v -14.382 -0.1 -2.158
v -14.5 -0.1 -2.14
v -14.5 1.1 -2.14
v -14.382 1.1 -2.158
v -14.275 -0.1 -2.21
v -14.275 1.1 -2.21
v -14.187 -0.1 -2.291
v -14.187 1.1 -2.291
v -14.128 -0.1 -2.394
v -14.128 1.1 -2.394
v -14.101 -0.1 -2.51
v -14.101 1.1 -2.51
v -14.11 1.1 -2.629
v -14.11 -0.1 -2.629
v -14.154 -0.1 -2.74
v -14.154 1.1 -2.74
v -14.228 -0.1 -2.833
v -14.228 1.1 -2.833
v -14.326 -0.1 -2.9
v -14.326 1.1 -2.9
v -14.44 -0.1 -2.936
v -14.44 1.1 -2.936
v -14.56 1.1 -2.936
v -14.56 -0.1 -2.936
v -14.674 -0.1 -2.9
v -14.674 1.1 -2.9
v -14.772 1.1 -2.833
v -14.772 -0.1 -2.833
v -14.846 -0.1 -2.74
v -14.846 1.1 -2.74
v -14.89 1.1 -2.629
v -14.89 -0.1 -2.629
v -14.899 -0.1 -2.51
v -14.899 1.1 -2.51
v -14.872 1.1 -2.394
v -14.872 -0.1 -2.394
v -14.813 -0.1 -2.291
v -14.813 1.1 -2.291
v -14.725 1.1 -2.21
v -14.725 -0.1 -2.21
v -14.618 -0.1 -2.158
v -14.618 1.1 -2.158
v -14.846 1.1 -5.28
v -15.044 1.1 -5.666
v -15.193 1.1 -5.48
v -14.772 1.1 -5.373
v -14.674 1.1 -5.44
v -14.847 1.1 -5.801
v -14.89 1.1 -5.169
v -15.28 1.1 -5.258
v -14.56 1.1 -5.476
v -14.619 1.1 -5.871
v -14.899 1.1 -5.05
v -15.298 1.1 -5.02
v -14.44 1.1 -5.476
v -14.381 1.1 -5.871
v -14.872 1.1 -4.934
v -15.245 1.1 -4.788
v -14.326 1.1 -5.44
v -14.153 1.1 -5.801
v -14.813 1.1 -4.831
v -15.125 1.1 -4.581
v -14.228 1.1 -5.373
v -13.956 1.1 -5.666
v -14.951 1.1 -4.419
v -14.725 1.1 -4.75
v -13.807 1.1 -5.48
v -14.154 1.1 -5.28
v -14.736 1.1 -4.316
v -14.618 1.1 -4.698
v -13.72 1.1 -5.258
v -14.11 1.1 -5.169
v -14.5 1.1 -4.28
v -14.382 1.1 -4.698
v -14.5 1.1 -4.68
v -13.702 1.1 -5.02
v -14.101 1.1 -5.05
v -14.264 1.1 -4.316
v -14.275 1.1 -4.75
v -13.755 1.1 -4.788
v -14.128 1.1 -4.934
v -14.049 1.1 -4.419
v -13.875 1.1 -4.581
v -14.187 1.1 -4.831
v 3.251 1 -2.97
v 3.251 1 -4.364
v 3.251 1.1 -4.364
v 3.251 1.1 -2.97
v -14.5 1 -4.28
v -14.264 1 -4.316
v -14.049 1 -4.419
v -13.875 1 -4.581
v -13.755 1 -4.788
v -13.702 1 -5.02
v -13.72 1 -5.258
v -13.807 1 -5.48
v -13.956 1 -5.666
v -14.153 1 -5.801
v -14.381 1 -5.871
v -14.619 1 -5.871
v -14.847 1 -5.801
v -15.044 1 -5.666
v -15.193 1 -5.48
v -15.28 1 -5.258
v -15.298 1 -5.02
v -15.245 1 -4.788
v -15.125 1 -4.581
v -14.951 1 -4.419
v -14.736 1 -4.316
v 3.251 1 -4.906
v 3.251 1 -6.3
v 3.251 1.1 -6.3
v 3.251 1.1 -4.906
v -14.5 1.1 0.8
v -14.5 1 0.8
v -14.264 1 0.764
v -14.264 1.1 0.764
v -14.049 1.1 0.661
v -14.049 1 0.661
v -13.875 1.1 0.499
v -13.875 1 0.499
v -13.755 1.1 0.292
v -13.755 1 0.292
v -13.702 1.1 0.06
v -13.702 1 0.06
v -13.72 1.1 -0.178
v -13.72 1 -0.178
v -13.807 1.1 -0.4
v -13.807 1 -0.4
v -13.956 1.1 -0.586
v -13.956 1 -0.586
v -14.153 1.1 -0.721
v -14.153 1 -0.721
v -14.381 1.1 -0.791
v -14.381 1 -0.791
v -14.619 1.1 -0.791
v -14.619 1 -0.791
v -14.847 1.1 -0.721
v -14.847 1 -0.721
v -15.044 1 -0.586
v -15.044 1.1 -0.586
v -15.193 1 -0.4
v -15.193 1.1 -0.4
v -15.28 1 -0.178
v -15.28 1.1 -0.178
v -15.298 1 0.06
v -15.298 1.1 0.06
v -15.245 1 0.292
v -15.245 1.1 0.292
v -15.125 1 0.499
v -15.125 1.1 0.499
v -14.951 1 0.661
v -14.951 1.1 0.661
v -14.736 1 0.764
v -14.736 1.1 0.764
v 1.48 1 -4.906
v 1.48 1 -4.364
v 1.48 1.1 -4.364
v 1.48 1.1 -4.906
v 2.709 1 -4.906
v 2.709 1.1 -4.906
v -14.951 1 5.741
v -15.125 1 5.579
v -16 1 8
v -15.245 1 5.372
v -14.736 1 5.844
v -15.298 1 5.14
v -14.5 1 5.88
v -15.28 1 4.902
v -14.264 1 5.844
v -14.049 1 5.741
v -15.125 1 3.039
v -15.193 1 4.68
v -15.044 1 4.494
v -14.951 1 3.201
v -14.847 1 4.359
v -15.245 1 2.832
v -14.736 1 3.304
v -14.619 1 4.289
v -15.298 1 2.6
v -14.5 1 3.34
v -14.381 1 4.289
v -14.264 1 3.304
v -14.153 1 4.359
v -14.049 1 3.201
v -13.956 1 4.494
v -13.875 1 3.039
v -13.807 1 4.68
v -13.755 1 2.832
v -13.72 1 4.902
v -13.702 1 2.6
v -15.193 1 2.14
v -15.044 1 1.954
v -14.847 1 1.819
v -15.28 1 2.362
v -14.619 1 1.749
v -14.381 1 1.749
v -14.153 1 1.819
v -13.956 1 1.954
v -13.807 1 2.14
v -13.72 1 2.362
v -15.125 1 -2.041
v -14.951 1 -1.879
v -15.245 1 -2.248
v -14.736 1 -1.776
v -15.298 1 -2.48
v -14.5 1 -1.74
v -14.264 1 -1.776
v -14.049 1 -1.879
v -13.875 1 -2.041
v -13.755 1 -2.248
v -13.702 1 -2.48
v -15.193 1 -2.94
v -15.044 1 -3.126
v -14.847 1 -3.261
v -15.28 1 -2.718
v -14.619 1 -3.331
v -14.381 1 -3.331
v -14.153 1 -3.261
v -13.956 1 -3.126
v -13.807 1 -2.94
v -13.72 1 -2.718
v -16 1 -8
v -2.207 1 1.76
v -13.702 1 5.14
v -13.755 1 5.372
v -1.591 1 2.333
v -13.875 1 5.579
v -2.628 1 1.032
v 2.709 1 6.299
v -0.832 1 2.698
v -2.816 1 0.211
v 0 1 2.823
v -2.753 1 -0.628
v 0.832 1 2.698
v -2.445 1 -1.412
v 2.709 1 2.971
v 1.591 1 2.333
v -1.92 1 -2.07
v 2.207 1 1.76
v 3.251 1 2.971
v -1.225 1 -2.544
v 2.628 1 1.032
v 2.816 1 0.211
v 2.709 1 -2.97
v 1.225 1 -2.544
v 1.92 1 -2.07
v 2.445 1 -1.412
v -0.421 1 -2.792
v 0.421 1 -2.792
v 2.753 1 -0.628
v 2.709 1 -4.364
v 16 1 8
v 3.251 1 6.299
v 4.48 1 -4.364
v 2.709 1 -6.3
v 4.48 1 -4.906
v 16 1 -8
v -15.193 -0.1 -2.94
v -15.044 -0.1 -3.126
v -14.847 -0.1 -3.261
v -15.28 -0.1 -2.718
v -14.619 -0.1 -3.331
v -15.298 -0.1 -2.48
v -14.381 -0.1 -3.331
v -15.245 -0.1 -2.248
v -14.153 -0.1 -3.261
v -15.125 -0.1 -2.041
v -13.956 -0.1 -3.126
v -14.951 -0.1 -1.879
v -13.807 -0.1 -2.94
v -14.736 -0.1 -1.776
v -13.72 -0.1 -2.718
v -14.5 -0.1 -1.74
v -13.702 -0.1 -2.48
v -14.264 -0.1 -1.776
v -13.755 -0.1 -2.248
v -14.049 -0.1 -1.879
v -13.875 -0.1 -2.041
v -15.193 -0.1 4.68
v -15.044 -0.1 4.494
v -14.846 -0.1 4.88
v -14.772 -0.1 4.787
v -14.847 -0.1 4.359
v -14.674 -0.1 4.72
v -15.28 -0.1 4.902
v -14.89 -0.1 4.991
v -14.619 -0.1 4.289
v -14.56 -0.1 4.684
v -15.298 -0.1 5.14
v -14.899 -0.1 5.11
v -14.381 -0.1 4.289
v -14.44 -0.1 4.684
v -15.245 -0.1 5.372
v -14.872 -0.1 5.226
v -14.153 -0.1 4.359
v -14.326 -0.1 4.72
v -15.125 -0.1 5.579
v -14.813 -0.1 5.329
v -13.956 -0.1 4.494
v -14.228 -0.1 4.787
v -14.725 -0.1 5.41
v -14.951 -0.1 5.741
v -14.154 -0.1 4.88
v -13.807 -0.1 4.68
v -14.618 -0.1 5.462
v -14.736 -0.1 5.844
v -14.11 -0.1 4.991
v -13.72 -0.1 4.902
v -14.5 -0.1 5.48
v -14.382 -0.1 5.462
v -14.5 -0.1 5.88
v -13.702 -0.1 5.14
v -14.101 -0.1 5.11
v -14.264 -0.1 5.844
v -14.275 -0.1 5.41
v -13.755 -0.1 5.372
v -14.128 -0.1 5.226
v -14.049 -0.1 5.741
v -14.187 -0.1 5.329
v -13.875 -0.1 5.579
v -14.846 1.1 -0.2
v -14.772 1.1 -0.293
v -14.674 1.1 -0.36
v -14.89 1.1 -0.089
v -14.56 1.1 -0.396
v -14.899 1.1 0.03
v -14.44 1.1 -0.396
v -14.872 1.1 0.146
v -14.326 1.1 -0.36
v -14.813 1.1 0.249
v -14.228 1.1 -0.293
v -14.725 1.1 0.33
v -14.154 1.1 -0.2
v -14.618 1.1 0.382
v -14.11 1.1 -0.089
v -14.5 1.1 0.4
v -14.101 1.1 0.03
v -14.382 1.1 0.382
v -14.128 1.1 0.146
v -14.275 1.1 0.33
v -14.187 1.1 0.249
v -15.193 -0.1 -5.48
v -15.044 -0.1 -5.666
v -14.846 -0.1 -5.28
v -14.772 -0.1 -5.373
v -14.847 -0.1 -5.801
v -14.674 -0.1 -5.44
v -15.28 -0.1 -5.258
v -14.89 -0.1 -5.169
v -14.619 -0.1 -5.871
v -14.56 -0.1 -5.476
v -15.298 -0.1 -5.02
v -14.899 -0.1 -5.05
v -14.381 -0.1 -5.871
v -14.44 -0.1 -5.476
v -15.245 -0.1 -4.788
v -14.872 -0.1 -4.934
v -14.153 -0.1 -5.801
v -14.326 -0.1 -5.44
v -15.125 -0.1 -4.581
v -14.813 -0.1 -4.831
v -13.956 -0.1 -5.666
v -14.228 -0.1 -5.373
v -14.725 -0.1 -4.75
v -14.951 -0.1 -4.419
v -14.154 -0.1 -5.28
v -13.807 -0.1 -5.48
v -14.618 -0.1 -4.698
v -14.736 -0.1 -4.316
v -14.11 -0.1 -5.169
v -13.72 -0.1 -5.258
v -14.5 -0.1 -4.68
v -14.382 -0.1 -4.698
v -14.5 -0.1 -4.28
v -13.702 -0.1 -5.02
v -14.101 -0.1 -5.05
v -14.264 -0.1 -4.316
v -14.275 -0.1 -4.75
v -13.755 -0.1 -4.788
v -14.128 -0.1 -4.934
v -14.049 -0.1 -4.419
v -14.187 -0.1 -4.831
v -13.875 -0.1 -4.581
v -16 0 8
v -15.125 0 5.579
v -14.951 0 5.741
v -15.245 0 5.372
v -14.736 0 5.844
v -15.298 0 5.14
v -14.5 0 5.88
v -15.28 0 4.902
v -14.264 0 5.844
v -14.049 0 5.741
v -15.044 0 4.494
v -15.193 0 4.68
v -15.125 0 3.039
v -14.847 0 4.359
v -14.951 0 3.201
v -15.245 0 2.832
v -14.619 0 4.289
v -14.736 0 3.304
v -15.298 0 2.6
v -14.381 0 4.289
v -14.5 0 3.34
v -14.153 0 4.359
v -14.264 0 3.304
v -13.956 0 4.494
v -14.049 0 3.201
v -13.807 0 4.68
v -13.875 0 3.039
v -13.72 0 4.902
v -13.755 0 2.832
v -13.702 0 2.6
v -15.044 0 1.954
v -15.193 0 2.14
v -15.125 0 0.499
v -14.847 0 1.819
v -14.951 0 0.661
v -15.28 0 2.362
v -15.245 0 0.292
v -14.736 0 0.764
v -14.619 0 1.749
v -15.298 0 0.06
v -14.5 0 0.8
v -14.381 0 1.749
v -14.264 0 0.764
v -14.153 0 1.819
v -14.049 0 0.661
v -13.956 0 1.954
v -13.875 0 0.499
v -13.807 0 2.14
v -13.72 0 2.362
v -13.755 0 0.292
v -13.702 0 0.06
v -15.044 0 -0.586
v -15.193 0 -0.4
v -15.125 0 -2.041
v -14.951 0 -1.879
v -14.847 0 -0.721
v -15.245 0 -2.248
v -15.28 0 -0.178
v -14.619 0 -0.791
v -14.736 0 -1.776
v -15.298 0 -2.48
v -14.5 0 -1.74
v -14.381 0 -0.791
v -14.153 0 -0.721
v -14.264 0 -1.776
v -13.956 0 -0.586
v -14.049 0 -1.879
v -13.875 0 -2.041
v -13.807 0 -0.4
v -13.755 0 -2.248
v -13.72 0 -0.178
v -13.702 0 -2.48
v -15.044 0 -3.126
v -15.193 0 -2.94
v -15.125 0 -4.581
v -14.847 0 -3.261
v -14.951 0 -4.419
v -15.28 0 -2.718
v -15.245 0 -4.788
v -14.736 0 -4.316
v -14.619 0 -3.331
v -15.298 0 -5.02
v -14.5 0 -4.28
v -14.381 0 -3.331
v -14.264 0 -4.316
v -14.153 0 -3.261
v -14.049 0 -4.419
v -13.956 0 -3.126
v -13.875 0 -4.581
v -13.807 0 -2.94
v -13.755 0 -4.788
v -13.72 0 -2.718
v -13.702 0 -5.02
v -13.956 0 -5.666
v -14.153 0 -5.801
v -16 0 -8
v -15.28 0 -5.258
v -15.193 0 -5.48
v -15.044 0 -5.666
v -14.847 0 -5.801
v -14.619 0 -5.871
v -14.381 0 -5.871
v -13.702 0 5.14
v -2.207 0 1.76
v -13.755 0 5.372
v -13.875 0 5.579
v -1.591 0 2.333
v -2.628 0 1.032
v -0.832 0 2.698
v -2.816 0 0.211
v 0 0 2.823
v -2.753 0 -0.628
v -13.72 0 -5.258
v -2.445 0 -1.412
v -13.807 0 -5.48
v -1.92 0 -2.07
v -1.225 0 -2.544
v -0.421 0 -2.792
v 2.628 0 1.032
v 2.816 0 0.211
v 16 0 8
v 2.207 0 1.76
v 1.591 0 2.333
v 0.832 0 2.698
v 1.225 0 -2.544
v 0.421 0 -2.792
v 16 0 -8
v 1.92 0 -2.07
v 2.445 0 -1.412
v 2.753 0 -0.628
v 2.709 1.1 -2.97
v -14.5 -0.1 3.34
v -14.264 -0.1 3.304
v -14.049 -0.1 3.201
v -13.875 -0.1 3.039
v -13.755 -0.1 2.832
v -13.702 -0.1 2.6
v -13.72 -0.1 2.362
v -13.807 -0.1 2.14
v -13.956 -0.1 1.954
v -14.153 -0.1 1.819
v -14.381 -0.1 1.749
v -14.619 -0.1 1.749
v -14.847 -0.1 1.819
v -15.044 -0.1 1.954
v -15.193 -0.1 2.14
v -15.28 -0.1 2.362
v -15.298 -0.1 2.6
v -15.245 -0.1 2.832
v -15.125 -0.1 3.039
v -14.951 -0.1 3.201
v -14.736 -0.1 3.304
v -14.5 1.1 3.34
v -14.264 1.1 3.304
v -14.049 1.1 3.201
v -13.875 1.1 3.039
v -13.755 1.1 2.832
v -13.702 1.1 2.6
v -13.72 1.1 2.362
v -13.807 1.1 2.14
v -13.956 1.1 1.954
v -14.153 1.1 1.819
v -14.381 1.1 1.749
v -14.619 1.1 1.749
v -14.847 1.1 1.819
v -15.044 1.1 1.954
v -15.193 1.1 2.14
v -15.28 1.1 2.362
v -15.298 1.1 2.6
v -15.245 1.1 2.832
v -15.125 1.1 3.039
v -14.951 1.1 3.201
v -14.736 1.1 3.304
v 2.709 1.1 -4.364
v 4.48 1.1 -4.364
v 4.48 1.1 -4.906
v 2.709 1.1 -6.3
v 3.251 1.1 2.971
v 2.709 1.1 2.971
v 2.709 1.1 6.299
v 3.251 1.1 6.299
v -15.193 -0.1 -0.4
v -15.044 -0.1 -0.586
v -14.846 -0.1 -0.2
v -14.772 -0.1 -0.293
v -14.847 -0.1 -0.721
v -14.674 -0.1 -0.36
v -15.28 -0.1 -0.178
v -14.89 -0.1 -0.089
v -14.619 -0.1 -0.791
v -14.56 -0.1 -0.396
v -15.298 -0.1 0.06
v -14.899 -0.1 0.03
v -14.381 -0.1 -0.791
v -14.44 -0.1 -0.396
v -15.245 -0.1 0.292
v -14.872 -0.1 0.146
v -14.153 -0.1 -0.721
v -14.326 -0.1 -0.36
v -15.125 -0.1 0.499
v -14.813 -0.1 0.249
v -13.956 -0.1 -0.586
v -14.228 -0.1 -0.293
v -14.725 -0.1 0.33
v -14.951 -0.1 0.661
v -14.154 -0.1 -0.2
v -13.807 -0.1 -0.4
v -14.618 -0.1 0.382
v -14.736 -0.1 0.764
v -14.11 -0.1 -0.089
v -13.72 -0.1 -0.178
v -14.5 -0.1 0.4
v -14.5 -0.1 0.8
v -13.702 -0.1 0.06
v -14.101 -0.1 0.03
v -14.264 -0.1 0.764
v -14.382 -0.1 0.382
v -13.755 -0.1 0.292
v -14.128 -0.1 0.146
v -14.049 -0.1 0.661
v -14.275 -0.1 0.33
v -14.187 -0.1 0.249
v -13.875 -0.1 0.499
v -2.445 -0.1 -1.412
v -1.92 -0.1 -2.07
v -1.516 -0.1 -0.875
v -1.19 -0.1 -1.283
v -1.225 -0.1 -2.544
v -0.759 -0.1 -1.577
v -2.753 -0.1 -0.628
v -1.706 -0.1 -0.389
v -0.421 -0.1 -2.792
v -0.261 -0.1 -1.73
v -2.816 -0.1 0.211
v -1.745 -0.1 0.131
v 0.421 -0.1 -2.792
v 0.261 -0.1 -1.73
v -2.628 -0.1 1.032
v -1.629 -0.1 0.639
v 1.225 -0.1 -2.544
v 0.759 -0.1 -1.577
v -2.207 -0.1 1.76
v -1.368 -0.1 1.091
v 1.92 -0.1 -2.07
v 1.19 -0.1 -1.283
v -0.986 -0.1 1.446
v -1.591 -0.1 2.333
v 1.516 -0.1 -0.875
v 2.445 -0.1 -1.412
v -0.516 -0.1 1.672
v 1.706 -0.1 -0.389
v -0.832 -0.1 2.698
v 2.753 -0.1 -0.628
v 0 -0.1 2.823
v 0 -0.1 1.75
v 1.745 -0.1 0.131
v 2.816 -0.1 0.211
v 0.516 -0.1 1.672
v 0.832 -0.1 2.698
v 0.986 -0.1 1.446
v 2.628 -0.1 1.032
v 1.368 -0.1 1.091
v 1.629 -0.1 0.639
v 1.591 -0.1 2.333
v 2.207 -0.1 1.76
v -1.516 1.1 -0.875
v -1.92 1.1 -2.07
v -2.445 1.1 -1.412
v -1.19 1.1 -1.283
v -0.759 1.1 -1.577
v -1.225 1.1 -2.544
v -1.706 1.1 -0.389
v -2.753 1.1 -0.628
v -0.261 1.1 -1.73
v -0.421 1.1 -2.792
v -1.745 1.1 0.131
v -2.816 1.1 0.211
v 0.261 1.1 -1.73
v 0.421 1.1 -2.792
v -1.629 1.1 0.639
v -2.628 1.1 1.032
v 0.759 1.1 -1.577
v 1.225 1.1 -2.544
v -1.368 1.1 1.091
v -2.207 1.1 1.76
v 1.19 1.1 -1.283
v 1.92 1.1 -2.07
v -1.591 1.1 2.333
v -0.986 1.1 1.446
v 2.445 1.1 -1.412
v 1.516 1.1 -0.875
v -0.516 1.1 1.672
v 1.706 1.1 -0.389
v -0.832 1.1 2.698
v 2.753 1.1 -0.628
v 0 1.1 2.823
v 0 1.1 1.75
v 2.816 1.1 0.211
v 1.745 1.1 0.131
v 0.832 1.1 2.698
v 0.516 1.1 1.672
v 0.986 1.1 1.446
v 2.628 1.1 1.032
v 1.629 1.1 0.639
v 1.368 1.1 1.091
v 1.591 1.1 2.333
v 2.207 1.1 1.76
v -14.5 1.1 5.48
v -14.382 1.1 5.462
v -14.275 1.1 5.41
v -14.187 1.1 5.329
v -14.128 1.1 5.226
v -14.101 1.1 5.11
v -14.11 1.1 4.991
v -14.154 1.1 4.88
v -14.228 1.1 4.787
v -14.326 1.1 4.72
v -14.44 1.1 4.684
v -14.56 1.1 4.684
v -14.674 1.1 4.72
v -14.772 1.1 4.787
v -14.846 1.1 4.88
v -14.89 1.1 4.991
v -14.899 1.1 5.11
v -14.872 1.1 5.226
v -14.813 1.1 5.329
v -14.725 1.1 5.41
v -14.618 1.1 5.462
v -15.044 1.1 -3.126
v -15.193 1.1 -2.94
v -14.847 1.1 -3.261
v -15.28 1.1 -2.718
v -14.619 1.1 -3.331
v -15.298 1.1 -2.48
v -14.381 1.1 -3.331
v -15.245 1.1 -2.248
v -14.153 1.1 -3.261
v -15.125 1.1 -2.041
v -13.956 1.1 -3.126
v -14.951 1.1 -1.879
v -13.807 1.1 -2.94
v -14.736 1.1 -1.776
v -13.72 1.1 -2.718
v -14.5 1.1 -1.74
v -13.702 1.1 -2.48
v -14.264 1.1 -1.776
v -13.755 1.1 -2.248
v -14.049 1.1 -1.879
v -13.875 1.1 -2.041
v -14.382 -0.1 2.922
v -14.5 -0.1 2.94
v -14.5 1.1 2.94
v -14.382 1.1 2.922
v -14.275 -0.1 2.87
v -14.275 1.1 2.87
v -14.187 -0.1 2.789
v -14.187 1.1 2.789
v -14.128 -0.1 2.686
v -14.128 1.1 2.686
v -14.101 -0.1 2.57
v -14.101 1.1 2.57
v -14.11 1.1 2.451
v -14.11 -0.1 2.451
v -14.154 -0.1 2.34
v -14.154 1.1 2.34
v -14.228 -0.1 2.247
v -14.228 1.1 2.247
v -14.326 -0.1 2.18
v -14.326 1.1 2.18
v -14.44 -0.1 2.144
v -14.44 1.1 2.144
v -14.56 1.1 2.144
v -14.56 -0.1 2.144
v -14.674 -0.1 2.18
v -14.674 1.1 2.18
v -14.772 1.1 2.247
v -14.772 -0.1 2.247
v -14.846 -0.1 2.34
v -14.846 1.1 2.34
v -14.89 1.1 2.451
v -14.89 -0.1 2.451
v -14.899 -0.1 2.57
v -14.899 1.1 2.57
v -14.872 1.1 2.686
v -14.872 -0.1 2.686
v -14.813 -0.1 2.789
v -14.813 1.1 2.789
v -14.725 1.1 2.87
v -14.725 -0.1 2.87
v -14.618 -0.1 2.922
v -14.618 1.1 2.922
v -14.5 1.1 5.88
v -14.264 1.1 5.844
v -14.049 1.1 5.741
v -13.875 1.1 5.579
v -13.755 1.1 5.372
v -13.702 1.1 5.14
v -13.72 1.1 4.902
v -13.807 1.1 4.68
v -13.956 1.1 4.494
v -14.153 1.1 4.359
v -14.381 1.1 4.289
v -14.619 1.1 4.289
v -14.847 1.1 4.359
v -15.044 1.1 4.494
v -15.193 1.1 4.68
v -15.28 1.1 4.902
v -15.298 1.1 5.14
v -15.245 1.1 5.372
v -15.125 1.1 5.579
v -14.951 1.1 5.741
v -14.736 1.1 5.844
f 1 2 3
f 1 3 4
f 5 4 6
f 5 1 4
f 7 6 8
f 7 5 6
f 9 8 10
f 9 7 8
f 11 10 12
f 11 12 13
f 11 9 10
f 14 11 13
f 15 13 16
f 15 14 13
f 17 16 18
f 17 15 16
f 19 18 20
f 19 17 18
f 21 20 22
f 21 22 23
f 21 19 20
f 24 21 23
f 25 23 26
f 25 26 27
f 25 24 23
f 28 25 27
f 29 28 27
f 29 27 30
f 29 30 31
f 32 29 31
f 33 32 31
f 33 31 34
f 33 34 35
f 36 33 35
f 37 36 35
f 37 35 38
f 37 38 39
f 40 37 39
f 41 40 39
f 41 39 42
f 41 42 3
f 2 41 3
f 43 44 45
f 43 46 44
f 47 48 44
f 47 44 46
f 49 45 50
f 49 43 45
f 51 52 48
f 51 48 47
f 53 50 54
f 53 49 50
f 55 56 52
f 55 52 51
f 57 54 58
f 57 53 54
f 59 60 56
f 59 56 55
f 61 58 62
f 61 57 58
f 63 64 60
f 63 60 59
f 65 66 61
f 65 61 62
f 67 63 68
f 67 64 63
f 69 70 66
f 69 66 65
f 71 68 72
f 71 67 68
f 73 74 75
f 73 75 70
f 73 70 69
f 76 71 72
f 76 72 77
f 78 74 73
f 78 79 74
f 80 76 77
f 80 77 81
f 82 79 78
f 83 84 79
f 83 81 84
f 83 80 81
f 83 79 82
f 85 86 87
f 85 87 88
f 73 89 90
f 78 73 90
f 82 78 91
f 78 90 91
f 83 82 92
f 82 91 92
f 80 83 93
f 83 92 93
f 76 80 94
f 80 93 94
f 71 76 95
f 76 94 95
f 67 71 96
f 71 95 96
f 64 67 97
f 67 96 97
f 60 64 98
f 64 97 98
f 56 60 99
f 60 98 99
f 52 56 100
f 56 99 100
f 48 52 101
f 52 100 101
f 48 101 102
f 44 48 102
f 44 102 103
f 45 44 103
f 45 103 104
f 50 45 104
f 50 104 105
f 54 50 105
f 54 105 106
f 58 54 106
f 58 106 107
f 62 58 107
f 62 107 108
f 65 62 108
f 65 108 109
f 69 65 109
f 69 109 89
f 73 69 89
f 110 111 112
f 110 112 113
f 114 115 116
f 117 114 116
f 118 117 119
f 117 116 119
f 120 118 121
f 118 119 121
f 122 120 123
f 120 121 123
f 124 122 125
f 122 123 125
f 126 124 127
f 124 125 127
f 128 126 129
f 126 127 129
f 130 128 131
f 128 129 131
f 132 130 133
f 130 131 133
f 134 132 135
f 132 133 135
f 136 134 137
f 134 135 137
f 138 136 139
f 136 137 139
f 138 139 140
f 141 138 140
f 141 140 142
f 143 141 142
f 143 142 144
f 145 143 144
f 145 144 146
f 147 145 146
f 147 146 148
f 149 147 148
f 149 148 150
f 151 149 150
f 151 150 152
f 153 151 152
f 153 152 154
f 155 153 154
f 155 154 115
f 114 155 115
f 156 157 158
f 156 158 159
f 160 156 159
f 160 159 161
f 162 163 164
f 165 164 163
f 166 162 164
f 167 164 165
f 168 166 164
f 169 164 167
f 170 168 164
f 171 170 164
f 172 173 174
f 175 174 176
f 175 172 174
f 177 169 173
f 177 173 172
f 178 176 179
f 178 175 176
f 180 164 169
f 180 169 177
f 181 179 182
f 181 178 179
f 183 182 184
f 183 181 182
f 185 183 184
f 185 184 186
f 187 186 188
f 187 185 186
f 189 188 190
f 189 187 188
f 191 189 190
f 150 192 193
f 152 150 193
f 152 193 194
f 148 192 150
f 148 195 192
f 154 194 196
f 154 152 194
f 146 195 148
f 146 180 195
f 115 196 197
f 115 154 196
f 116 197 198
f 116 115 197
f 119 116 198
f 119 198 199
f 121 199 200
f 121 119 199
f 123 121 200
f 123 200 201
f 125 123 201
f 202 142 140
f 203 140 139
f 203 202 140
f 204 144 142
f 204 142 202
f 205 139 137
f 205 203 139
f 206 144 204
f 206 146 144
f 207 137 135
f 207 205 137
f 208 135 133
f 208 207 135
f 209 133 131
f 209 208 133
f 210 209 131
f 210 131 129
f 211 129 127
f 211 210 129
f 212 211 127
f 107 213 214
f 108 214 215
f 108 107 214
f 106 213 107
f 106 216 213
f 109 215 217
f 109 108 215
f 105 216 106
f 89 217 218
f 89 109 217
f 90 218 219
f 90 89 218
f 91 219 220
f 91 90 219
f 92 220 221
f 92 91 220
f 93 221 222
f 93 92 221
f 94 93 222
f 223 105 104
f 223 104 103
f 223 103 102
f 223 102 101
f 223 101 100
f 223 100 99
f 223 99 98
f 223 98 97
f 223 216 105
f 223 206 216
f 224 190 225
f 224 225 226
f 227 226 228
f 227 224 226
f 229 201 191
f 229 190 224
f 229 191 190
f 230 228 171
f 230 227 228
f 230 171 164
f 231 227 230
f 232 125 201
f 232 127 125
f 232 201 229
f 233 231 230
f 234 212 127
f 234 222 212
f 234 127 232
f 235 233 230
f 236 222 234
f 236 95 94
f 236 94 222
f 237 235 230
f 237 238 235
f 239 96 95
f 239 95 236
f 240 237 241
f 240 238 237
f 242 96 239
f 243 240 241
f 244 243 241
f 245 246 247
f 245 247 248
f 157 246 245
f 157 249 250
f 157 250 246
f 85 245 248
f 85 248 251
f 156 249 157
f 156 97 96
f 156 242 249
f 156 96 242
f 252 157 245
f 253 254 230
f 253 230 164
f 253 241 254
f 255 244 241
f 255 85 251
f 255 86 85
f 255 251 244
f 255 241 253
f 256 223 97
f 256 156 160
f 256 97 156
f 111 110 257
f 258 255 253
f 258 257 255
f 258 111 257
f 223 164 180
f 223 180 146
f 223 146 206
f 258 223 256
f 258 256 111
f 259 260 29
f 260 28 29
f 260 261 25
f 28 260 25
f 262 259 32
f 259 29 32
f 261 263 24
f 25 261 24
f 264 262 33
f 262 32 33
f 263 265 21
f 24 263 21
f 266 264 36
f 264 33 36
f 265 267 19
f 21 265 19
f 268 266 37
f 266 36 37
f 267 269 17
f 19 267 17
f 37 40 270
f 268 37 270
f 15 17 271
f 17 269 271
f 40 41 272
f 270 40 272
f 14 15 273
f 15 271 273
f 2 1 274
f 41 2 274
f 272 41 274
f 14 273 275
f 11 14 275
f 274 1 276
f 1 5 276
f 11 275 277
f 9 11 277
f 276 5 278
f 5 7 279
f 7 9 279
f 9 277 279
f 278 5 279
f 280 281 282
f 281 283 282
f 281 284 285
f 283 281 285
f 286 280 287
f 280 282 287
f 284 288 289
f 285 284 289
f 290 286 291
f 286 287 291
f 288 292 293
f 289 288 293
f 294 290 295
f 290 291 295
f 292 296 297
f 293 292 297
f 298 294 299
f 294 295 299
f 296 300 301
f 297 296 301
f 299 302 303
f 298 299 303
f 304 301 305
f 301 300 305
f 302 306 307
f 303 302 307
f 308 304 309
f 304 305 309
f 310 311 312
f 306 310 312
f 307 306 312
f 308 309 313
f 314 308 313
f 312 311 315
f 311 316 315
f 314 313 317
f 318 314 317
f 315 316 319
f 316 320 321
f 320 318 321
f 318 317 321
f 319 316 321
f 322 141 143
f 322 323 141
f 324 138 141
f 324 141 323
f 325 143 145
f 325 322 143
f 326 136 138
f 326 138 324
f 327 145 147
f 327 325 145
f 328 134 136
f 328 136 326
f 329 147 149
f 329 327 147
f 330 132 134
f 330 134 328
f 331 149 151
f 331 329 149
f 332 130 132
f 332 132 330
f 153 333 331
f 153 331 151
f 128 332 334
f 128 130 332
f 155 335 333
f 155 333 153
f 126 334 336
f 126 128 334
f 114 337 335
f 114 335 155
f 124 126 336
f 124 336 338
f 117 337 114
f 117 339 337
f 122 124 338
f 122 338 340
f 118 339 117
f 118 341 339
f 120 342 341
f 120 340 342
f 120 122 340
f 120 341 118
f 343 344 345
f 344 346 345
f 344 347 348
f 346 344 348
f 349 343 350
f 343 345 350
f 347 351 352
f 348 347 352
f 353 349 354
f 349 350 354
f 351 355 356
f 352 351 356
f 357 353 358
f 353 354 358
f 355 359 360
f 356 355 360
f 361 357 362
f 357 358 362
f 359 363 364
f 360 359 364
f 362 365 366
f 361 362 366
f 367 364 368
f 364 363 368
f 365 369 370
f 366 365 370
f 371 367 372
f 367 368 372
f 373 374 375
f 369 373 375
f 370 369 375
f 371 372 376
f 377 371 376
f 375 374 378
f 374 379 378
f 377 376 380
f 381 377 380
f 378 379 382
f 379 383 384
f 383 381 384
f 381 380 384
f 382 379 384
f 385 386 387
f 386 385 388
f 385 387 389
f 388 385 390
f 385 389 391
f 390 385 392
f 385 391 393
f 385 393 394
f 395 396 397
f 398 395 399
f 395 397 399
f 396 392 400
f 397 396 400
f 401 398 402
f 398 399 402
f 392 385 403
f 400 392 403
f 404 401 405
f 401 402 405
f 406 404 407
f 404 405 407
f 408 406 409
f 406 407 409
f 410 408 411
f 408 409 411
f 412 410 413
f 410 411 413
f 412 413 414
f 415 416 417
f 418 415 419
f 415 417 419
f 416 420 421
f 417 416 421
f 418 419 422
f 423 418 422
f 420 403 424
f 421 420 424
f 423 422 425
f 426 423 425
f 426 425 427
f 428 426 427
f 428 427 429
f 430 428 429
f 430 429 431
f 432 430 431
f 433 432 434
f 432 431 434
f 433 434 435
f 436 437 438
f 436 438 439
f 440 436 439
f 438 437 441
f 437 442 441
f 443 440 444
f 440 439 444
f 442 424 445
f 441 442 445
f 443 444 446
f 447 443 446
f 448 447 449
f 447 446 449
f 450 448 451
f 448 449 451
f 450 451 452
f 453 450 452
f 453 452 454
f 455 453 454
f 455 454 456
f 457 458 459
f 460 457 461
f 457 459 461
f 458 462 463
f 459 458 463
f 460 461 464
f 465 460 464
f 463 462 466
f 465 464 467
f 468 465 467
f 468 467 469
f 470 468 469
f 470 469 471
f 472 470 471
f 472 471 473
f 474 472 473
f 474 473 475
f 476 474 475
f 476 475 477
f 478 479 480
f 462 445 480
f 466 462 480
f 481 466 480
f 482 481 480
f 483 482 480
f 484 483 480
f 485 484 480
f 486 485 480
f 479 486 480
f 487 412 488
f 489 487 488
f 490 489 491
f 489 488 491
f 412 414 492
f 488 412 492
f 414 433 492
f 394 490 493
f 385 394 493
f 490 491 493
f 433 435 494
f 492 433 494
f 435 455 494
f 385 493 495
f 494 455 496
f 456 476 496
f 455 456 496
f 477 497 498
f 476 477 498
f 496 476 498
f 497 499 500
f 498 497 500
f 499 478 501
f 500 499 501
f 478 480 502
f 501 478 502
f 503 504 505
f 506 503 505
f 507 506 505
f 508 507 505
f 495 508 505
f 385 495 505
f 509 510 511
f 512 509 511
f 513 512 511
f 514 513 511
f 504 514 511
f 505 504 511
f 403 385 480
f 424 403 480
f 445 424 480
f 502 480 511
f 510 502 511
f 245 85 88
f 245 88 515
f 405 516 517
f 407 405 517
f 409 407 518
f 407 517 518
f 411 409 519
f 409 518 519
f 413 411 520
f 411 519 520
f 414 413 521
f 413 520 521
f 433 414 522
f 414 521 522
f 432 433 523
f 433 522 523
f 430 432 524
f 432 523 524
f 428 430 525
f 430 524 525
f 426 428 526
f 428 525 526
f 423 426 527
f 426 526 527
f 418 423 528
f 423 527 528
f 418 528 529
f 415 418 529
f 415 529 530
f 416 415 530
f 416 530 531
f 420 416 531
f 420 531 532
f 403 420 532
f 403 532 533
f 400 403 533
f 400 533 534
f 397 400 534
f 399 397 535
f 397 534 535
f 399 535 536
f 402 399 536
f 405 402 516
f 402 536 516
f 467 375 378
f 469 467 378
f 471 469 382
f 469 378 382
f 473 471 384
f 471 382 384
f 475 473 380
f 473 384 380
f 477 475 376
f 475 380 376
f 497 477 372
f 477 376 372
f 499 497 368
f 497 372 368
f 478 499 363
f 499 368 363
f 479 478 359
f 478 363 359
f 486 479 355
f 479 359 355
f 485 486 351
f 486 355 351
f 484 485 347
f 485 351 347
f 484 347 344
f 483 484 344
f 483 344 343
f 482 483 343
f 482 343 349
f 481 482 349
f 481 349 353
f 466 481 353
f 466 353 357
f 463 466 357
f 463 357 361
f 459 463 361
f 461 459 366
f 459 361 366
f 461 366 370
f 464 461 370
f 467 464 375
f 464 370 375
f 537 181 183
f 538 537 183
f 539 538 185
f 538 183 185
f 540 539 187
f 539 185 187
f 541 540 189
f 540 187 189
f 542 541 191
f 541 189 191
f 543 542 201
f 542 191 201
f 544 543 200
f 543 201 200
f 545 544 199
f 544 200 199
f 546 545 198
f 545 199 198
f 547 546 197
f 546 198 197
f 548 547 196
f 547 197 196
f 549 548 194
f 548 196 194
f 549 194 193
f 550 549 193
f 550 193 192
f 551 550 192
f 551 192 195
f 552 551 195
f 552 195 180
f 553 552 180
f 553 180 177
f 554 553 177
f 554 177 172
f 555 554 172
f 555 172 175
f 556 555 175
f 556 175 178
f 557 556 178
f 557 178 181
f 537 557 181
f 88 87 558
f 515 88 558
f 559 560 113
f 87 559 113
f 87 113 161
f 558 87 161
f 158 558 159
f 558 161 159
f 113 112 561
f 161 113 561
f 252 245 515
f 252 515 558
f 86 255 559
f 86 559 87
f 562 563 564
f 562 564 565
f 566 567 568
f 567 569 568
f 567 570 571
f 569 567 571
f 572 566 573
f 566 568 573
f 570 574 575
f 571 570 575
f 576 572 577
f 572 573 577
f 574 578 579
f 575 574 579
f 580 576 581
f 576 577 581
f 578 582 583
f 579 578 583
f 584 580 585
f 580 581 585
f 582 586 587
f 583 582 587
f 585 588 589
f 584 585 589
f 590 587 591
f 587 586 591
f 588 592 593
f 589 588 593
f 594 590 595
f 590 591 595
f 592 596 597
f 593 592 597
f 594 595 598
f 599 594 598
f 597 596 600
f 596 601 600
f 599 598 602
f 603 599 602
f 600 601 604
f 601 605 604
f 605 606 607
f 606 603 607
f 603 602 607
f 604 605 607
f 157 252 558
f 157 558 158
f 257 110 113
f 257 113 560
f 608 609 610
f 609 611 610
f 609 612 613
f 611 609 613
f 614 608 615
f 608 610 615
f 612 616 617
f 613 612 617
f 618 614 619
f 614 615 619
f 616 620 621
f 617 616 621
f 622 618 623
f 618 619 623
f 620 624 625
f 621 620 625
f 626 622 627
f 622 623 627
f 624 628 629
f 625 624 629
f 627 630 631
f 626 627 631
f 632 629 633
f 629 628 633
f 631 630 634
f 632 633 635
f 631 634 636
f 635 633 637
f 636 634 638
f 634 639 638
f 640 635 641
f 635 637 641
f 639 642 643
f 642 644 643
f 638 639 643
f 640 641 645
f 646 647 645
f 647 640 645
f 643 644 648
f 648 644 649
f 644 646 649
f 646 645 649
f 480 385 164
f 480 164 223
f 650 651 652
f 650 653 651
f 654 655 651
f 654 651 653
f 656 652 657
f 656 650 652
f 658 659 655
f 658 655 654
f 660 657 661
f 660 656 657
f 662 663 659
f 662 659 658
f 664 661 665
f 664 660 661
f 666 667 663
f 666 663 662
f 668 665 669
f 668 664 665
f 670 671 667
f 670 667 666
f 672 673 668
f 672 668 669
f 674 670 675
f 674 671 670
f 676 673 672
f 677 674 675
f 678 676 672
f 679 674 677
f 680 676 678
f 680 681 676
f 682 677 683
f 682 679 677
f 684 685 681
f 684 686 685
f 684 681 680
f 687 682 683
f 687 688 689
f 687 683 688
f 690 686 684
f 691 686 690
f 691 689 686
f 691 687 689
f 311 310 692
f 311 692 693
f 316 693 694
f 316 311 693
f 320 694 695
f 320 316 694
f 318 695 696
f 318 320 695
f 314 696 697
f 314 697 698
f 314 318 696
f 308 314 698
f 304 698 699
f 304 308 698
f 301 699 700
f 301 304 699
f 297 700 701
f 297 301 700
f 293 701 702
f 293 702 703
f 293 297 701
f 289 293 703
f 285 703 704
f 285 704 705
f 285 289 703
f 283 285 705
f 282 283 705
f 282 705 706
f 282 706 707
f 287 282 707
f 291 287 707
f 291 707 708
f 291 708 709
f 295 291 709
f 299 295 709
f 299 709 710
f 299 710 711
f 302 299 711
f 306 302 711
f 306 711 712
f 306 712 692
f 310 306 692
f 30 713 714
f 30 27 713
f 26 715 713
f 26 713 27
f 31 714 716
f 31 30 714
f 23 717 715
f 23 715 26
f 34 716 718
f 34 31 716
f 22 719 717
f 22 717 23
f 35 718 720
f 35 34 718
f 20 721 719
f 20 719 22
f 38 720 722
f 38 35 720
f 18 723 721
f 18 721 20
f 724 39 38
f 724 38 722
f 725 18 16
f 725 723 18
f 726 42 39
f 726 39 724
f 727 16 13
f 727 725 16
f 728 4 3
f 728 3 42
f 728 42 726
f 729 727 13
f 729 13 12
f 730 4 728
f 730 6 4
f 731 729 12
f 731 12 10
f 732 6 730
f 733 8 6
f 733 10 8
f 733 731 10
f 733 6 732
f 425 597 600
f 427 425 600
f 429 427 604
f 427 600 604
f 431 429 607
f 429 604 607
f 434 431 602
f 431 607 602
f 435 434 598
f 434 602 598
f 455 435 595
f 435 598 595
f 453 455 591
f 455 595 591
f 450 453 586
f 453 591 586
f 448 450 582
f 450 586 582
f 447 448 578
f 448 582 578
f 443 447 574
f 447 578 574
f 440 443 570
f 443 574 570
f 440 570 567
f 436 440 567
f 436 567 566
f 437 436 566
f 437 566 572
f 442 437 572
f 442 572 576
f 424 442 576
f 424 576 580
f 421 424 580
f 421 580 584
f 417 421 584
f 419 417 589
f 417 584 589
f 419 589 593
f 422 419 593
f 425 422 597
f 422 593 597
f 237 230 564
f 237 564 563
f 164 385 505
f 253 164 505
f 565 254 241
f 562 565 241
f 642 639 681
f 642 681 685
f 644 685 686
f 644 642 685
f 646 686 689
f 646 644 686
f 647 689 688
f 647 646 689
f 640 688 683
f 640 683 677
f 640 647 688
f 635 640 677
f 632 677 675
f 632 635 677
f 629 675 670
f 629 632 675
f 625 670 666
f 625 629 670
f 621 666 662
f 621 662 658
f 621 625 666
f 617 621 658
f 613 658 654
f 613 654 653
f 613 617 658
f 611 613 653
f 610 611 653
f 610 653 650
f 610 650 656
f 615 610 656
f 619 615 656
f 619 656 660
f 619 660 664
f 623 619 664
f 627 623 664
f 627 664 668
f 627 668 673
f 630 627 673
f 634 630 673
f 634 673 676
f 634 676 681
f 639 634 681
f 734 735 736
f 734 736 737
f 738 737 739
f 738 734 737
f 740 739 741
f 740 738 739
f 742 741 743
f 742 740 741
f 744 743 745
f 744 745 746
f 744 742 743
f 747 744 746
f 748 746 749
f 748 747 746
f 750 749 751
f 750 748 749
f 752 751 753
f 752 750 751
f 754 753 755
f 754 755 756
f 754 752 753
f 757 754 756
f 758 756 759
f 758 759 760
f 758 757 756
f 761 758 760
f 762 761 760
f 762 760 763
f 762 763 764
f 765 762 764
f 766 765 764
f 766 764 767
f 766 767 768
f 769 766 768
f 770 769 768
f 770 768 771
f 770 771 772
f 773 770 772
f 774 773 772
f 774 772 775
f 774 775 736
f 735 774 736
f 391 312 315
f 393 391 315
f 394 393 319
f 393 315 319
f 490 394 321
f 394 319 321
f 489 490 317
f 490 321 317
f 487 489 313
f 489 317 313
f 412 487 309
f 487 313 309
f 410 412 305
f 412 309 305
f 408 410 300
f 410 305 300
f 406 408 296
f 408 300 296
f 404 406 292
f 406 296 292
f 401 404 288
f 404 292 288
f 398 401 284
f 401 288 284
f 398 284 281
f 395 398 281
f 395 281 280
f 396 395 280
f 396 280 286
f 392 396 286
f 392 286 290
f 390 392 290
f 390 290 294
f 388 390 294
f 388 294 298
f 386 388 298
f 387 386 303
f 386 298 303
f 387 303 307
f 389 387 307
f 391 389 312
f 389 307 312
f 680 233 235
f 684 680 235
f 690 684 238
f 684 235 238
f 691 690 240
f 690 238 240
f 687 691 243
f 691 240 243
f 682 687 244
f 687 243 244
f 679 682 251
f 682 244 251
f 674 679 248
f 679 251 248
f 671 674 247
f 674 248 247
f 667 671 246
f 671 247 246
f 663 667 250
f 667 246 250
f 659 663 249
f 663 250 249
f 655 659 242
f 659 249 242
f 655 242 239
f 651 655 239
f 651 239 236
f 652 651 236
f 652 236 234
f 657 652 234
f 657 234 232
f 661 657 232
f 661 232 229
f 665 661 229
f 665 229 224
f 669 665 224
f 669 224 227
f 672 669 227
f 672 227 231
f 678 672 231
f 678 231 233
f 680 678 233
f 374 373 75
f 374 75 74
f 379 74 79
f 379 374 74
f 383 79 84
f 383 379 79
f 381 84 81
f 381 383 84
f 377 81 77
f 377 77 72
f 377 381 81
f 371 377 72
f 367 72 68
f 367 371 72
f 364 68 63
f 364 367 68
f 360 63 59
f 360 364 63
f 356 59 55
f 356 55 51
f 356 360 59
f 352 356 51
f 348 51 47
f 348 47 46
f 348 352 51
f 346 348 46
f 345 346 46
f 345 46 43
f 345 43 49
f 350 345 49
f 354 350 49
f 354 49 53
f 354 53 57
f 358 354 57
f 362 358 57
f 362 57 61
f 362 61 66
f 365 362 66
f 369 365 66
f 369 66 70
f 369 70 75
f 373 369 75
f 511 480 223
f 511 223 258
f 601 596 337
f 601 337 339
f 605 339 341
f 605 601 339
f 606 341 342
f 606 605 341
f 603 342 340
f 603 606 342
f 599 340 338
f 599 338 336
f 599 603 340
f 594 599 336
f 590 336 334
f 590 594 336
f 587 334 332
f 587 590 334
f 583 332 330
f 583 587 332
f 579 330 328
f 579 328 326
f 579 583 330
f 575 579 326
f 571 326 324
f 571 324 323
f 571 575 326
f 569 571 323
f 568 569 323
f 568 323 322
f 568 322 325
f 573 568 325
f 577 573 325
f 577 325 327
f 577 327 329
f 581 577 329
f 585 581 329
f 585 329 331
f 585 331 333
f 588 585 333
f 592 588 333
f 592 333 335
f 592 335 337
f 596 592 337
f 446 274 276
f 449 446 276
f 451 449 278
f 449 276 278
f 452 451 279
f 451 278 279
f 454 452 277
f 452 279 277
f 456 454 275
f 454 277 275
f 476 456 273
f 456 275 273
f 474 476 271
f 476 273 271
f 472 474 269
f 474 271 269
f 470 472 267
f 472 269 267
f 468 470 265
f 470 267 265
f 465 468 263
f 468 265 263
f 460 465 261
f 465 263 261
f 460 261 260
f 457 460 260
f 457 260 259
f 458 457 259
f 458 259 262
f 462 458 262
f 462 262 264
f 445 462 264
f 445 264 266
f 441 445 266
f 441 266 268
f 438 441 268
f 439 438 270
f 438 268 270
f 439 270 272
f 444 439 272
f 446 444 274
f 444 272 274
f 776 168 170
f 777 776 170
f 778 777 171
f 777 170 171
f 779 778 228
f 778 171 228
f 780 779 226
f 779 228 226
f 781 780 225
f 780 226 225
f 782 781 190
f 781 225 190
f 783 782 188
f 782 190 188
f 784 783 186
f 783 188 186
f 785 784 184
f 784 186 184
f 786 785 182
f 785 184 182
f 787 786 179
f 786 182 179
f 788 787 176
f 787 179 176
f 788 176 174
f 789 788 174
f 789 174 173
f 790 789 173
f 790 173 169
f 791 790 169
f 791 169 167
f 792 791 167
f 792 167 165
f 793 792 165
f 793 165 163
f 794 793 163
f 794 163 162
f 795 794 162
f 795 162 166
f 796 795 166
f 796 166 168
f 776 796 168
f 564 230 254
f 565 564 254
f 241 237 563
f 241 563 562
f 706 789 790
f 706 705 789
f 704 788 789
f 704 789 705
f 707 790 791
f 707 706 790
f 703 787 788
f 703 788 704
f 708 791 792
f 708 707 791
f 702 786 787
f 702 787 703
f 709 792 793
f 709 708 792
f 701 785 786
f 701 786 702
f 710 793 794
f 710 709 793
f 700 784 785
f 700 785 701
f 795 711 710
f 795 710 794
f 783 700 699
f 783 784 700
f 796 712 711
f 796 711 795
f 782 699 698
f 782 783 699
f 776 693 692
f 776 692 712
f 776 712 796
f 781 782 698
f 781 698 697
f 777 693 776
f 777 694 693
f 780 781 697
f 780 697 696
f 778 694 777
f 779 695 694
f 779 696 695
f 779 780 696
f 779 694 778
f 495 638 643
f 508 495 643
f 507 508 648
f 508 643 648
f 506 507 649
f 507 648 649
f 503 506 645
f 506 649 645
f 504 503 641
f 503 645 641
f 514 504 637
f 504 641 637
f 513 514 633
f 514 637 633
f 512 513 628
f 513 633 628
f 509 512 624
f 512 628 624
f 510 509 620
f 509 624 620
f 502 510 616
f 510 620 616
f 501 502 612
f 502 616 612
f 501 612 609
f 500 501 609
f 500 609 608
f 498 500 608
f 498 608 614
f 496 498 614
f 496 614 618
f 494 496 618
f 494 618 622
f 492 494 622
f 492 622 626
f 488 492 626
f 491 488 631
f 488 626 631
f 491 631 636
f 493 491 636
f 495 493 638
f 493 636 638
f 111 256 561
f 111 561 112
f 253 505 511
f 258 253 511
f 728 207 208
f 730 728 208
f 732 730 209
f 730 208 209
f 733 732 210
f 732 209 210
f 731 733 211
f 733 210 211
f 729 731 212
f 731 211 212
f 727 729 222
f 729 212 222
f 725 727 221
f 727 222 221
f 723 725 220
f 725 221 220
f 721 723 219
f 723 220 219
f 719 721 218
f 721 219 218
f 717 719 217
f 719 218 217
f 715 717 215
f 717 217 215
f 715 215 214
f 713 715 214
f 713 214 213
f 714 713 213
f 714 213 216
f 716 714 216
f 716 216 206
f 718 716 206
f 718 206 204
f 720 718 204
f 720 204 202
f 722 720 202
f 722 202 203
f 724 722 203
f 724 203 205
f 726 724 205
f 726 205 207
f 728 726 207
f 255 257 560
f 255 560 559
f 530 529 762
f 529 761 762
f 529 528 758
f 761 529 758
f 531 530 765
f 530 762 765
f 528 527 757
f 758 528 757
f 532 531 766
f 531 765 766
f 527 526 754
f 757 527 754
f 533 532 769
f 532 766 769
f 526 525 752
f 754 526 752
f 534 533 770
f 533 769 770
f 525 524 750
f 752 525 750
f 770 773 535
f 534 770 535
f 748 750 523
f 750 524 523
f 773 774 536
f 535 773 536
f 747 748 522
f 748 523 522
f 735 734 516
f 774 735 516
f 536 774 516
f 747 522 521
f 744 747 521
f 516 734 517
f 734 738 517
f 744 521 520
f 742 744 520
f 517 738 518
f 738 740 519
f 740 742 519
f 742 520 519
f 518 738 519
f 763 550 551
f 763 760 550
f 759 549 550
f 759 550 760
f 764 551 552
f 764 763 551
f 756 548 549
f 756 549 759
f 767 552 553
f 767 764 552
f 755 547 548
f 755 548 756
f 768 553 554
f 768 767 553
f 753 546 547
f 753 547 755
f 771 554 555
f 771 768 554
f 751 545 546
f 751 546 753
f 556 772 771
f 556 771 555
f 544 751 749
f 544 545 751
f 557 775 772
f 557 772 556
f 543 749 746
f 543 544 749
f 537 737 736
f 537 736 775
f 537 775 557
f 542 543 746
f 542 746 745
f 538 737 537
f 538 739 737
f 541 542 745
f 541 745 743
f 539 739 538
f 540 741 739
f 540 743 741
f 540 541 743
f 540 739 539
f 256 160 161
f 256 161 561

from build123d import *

# Parameters (mm, degrees)
SKETCH1_W                = 32
SKETCH1_H                = 16
BOSS_EXTRUDE1_DEPTH      = 1
SKETCH2_R                = 1.75
SKETCH2_R_2              = 0.4
CUT_EXTRUDE1_DEPTH       = 1
BOSS_EXTRUDE2_DEPTH      = 0.1
BOSS_EXTRUDE2_DEPTH_BACK = 1.1
SKETCH3_R                = 0.8
SKETCH3_R_2              = 0.4
SKETCH3_R_3              = 2.823446158
SKETCH3_R_4              = 1.75
SKETCH4_W                = 0.541769891
SKETCH4_H                = 3.328015046
BOSS_EXTRUDE3_DEPTH      = 0.1


with BuildPart() as part:
    # Sketch1 → Boss-Extrude1 (new body)
    with BuildSketch(Plane(origin=(0, 0, 0), x_dir=(1, 0, 0), z_dir=(0, 1, 0))):
        Rectangle(SKETCH1_W, SKETCH1_H)
    extrude(amount=BOSS_EXTRUDE1_DEPTH)

    # Sketch2 → Cut-Extrude1 (cut)
    with BuildSketch(Plane(origin=(0, 1, 0), x_dir=(1, 0, 0), z_dir=(0, 1, 0))):
        with Locations(Location((0, 0, 0), (0, 0, 270))):
            Circle(SKETCH2_R)
        with Locations(Location((-14.5, -5.08, 0), (0, 0, 270))):
            Circle(SKETCH2_R_2)
        with Locations(Location((-14.5, -2.54, 0), (0, 0, 270))):
            Circle(SKETCH2_R_2)
        with Locations(Location((-14.5, 0, 0), (0, 0, 270))):
            Circle(SKETCH2_R_2)
        with Locations(Location((-14.5, 2.54, 0), (0, 0, 270))):
            Circle(SKETCH2_R_2)
        with Locations(Location((-14.5, 5.08, 0), (0, 0, 270))):
            Circle(SKETCH2_R_2)
    extrude(amount=-CUT_EXTRUDE1_DEPTH, mode=Mode.SUBTRACT)

    # Sketch3 → Boss-Extrude2 (add, two sides: drawn at the far end of the back side and taken through both)
    # profile 1 of 6: a face of its own
    with BuildSketch(Plane(origin=(0, 1, 0), x_dir=(1, 0, 0), z_dir=(0, 1, 0)).offset(-BOSS_EXTRUDE2_DEPTH_BACK)):
        with Locations(Location((-14.5, 5.08, 0), (0, 0, 270))):
            Circle(SKETCH3_R)
        with Locations(Location((-14.5, 5.08, 0), (0, 0, 270))):
            Circle(SKETCH3_R_2, mode=Mode.SUBTRACT)
    # profile 2 of 6: a face of its own
    with BuildSketch(Plane(origin=(0, 1, 0), x_dir=(1, 0, 0), z_dir=(0, 1, 0)).offset(-BOSS_EXTRUDE2_DEPTH_BACK)):
        with Locations(Location((-14.5, 2.54, 0), (0, 0, 270))):
            Circle(SKETCH3_R)
        with Locations(Location((-14.5, 2.54, 0), (0, 0, 270))):
            Circle(SKETCH3_R_2, mode=Mode.SUBTRACT)
    # profile 3 of 6: a face of its own
    with BuildSketch(Plane(origin=(0, 1, 0), x_dir=(1, 0, 0), z_dir=(0, 1, 0)).offset(-BOSS_EXTRUDE2_DEPTH_BACK)):
        with Locations(Location((-14.5, 0, 0), (0, 0, 270))):
            Circle(SKETCH3_R)
        with Locations(Location((-14.5, 0, 0), (0, 0, 270))):
            Circle(SKETCH3_R_2, mode=Mode.SUBTRACT)
    # profile 4 of 6: a face of its own
    with BuildSketch(Plane(origin=(0, 1, 0), x_dir=(1, 0, 0), z_dir=(0, 1, 0)).offset(-BOSS_EXTRUDE2_DEPTH_BACK)):
        with Locations(Location((-14.5, -2.54, 0), (0, 0, 270))):
            Circle(SKETCH3_R)
        with Locations(Location((-14.5, -2.54, 0), (0, 0, 270))):
            Circle(SKETCH3_R_2, mode=Mode.SUBTRACT)
    # profile 5 of 6: a face of its own
    with BuildSketch(Plane(origin=(0, 1, 0), x_dir=(1, 0, 0), z_dir=(0, 1, 0)).offset(-BOSS_EXTRUDE2_DEPTH_BACK)):
        with Locations(Location((-14.5, -5.08, 0), (0, 0, 270))):
            Circle(SKETCH3_R)
        with Locations(Location((-14.5, -5.08, 0), (0, 0, 270))):
            Circle(SKETCH3_R_2, mode=Mode.SUBTRACT)
    # profile 6 of 6: a face of its own
    with BuildSketch(Plane(origin=(0, 1, 0), x_dir=(1, 0, 0), z_dir=(0, 1, 0)).offset(-BOSS_EXTRUDE2_DEPTH_BACK)):
        with Locations(Location((0, 0, 0), (0, 0, 270))):
            Circle(SKETCH3_R_3)
        with Locations(Location((0, 0, 0), (0, 0, 270))):
            Circle(SKETCH3_R_4, mode=Mode.SUBTRACT)
    extrude(amount=BOSS_EXTRUDE2_DEPTH + BOSS_EXTRUDE2_DEPTH_BACK)

    # Sketch4 → Boss-Extrude3 (add)
    with BuildSketch(Plane(origin=(0, 1, 0), x_dir=(1, 0, 0), z_dir=(0, 1, 0))):
        Polygon((3.250619348, 6.3), (3.250619348, 4.905884946), (4.479734402, 4.905884946), (4.479734402, 4.364115054), (3.250619348, 4.364115054), (3.250619348, 2.97), (2.708849457, 2.97), (2.708849457, 4.364115054), (1.479734402, 4.364115054), (1.479734402, 4.905884946), (2.708849457, 4.905884946), (2.708849457, 6.3), align=None)
        with Locations((2.979734403, -4.634884299)):
            Rectangle(SKETCH4_W, SKETCH4_H)
    extrude(amount=BOSS_EXTRUDE3_DEPTH)


solid = part.part
